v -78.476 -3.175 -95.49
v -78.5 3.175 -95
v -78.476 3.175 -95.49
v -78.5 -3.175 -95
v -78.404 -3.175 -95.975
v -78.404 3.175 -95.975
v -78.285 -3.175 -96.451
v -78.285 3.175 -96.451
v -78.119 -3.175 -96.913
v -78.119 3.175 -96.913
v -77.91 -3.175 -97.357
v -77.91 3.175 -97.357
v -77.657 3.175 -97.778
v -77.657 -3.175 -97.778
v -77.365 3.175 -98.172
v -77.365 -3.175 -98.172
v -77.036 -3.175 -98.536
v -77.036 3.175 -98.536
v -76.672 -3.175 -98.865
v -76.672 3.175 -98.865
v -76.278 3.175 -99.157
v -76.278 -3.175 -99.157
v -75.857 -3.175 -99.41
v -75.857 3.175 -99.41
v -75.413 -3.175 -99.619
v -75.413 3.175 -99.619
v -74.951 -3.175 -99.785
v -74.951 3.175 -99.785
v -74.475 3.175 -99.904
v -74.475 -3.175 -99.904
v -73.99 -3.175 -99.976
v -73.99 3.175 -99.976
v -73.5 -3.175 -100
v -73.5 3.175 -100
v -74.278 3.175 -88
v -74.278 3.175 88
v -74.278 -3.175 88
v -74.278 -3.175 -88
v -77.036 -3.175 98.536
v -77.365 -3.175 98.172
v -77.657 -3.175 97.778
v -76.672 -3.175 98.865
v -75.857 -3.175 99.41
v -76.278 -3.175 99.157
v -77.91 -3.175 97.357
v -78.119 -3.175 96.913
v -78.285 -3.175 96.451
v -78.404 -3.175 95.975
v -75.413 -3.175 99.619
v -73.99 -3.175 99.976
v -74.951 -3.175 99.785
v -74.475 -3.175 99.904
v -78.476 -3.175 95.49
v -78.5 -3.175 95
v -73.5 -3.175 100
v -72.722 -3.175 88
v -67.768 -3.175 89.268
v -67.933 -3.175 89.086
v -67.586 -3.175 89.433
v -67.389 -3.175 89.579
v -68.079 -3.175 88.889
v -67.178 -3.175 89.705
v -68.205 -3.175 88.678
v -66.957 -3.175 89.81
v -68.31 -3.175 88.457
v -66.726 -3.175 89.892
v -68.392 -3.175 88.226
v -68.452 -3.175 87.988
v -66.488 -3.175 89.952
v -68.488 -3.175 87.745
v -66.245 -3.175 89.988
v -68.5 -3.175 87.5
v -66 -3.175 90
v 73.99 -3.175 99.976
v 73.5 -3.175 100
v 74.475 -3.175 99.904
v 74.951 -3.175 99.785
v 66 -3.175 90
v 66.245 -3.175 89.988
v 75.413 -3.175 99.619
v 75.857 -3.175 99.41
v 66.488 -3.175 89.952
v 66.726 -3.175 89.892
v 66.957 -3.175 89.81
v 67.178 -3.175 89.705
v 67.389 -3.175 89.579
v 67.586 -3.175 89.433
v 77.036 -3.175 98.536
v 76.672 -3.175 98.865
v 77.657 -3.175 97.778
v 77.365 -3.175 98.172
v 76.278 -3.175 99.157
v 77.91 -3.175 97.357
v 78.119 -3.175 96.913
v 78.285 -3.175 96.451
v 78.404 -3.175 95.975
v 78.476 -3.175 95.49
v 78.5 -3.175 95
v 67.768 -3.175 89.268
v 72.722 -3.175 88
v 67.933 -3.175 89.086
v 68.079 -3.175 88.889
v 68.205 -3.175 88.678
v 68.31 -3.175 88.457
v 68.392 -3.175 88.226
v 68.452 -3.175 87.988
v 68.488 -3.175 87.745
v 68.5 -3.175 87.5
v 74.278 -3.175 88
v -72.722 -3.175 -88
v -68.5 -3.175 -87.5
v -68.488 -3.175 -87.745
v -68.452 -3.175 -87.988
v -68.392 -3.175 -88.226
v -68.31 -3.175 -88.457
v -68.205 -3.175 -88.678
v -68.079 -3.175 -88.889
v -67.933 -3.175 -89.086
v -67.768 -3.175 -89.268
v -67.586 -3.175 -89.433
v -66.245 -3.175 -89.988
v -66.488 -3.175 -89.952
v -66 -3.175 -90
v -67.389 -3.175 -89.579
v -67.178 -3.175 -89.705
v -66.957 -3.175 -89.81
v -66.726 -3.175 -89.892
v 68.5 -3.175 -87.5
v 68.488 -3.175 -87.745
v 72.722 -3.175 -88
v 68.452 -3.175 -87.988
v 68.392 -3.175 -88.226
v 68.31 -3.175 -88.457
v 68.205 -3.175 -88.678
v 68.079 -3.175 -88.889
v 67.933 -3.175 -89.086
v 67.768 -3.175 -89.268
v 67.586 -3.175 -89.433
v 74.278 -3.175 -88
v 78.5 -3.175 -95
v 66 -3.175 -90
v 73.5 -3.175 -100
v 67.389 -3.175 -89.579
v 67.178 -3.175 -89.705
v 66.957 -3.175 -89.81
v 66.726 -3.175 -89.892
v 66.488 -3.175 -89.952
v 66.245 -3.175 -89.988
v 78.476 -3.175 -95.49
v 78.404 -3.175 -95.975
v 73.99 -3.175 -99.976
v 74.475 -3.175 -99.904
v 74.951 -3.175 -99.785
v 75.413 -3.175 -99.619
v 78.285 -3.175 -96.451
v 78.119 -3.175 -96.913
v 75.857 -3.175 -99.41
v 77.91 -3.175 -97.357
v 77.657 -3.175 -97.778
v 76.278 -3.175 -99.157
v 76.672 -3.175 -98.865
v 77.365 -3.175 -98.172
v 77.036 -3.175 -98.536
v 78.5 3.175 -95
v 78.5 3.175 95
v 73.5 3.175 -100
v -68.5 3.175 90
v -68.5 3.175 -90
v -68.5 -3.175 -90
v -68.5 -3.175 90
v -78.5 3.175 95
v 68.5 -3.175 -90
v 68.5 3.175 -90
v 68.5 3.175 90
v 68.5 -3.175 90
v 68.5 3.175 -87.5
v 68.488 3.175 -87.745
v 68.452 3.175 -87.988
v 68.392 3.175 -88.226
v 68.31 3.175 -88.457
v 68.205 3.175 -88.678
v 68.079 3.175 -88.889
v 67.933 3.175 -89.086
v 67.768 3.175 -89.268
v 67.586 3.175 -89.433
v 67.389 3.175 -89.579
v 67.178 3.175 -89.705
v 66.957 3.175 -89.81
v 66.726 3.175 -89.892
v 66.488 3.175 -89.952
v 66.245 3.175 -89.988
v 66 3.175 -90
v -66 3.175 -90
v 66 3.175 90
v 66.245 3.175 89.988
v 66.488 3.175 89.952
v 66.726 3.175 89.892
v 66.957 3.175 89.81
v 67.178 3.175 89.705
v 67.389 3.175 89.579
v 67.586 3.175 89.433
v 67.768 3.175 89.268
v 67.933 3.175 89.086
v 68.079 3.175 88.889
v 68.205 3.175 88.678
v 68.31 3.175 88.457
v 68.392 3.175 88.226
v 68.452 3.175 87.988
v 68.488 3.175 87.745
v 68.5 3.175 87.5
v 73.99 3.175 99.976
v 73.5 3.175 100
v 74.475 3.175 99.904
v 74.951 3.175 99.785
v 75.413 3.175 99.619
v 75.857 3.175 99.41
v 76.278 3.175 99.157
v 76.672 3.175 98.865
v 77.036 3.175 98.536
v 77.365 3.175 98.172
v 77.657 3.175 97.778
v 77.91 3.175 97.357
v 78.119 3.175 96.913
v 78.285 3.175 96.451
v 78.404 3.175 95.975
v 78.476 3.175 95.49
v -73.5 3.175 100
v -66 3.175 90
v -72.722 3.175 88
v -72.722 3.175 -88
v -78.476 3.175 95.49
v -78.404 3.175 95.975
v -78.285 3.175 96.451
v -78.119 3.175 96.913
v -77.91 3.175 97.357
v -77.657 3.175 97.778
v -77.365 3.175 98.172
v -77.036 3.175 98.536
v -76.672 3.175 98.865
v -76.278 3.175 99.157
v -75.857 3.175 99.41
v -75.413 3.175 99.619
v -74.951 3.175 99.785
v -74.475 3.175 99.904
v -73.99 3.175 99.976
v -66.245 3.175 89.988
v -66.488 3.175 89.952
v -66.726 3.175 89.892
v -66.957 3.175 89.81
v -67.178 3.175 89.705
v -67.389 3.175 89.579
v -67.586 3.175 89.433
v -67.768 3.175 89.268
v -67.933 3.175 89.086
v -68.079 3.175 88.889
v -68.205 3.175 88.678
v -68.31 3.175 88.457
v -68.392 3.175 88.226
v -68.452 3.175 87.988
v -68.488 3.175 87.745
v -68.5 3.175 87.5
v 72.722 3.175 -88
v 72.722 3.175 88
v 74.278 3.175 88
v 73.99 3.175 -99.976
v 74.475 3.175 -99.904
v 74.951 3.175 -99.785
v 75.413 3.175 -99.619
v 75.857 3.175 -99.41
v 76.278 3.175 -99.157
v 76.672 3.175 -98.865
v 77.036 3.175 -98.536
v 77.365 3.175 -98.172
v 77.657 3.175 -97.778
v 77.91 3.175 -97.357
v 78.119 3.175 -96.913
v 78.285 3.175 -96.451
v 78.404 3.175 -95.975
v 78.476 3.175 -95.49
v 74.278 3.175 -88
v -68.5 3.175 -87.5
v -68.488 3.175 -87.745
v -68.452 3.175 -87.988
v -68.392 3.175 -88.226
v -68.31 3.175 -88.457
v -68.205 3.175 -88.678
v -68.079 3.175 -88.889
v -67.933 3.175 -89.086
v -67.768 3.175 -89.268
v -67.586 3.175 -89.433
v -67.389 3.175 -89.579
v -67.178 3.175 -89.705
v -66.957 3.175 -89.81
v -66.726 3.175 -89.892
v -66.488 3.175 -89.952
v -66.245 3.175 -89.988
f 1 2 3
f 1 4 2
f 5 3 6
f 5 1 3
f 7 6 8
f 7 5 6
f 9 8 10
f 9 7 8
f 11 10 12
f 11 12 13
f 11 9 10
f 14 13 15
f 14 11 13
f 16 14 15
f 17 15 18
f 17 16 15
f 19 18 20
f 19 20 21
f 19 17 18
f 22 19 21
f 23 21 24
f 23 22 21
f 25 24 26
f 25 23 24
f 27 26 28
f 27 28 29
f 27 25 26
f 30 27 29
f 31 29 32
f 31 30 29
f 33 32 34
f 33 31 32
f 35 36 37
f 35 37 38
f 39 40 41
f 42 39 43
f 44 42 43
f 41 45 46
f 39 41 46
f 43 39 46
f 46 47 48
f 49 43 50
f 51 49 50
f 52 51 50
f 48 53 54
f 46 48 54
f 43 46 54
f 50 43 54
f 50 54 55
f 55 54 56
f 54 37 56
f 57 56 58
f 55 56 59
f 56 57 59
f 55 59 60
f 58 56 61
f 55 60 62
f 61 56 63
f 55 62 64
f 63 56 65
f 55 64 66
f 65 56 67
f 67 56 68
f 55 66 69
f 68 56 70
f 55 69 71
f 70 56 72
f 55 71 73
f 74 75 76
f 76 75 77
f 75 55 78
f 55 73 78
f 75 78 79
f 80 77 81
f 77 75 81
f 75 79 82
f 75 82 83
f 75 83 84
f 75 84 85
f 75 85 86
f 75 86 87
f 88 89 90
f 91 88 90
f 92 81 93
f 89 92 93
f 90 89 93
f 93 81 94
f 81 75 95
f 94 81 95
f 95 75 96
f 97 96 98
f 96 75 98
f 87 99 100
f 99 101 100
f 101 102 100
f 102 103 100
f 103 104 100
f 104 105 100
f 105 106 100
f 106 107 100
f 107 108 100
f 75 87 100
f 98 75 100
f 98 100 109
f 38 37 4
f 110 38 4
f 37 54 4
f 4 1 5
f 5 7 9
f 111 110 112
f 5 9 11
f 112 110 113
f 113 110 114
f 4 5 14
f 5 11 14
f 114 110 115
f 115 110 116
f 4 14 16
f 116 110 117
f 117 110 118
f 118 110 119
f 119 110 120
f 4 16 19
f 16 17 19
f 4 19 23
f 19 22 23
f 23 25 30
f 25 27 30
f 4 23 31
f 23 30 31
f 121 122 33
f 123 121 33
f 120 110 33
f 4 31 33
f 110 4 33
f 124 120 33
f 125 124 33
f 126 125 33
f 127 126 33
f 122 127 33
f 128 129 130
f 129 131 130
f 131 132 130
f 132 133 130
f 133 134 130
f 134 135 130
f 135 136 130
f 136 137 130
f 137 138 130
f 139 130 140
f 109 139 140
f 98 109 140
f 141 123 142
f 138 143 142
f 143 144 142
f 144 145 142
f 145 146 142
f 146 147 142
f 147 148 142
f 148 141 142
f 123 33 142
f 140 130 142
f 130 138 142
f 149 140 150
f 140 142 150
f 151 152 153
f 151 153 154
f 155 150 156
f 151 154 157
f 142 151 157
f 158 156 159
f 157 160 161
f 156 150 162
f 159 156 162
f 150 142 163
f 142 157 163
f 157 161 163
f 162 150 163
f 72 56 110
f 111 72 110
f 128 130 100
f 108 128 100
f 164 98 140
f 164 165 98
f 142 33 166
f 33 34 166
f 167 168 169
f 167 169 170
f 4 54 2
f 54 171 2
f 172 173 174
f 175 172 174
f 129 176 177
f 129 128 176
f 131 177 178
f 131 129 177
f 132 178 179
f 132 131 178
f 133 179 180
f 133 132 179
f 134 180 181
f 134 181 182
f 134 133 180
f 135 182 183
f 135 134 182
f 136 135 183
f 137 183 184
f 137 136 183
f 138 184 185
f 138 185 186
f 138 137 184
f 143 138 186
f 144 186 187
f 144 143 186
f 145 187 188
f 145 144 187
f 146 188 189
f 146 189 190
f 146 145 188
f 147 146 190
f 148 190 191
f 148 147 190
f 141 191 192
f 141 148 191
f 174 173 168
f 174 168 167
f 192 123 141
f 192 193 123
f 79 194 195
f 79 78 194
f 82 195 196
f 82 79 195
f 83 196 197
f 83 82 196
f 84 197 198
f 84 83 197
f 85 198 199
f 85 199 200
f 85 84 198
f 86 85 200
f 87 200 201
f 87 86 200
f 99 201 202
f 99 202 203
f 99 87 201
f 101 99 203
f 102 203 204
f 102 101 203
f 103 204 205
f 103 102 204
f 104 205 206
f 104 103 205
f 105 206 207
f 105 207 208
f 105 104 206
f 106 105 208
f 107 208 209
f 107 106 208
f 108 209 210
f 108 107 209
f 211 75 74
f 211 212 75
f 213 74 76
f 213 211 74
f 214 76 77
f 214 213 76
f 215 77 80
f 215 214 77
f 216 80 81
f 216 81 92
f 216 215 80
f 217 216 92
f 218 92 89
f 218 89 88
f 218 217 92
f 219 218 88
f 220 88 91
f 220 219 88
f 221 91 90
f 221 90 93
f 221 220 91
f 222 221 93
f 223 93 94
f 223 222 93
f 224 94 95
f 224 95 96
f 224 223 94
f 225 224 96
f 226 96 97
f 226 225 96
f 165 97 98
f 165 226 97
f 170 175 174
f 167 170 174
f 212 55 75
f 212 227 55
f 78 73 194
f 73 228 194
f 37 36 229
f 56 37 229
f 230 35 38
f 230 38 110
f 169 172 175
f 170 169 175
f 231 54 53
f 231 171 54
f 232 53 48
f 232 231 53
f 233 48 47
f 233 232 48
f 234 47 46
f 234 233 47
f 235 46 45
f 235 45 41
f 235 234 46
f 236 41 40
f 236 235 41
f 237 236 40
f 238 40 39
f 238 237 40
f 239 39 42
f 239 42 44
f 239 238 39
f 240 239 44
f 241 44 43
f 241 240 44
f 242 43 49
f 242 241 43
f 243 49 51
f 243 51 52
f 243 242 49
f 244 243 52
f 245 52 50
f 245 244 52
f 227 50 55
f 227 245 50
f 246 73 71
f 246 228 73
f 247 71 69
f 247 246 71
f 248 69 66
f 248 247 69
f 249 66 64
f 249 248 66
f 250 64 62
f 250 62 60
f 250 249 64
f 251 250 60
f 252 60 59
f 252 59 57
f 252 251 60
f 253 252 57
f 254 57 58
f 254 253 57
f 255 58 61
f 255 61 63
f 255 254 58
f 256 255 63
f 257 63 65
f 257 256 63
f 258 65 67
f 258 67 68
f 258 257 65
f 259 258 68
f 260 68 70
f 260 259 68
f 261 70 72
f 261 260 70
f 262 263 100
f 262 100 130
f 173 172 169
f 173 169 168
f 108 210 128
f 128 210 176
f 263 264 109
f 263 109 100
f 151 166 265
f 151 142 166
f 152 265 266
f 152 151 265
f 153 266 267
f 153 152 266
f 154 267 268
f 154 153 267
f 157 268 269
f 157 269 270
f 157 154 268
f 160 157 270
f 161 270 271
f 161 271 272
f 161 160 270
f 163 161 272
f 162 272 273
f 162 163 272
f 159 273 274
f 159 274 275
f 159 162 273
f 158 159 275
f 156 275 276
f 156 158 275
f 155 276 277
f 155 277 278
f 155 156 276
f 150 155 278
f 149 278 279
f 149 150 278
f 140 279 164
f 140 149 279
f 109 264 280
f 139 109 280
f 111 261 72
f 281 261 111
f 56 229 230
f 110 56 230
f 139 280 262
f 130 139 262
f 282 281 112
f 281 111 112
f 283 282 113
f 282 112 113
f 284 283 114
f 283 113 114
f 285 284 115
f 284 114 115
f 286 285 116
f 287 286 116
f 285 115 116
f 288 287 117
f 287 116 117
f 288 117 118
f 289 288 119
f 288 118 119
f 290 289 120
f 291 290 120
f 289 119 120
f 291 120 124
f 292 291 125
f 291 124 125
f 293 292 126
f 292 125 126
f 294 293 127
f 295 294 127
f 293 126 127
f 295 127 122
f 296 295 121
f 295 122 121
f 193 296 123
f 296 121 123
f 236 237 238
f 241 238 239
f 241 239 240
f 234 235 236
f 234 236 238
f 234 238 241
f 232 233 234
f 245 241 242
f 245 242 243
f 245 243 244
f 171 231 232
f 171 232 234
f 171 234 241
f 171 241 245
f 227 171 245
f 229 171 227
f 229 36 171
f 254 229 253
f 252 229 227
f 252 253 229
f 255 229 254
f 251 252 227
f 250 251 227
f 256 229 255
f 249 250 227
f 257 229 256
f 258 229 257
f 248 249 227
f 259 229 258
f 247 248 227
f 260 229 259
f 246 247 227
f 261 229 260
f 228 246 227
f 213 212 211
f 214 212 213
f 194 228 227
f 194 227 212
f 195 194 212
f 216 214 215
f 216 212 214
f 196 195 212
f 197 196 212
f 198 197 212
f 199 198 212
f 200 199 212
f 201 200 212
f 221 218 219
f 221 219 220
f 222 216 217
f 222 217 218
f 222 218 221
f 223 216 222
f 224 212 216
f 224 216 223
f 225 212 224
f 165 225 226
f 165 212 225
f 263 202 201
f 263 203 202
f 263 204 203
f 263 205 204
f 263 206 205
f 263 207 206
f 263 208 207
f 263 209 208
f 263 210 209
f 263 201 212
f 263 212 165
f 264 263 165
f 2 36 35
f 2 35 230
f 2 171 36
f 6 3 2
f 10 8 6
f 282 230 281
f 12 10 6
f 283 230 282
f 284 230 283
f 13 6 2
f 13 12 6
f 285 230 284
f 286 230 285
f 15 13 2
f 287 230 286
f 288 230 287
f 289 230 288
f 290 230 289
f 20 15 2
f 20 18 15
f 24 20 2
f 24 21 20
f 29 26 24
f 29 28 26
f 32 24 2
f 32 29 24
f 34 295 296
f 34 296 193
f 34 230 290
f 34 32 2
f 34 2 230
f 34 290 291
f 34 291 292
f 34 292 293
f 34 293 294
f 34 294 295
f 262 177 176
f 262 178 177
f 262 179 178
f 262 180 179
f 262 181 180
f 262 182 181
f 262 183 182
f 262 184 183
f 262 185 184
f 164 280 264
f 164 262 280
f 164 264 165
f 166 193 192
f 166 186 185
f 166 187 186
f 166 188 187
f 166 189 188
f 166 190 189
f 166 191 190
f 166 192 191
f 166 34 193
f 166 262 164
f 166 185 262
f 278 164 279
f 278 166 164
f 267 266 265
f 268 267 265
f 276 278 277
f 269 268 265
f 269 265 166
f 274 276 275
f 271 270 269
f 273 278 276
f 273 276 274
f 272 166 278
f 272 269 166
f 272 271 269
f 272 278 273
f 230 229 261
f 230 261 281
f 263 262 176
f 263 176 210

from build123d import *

# Parameters (mm, degrees)
SKETCH1_W           = 157
SKETCH1_H           = 200
SKETCH1_W_2         = 137
SKETCH1_H_2         = 180
MAINBODY_DEPTH      = 3.175
SHEETLOCK_REACH     = 129.289
SKETCH2_W           = 1.55575
SKETCH2_H           = 176
SKETCH4_W           = 180
SKETCH4_H           = 6.35
BOSS_EXTRUDE1_DEPTH = 137
FILLET1_R           = 5
FILLET2_R           = 2.5


with BuildPart() as part:
    # Sketch1 → MainBody (new, symmetric)
    with BuildSketch(Plane(origin=(0, 0, 0), x_dir=(1, 0, 0), z_dir=(0, 1, 0))):
        Rectangle(SKETCH1_W, SKETCH1_H)
        Rectangle(SKETCH1_W_2, SKETCH1_H_2, mode=Mode.SUBTRACT)
    extrude(amount=MAINBODY_DEPTH, both=True)

    # Sketch2 → SheetLock (cut, up to next)
    with BuildSketch(Plane(origin=(0, 3.175, 0), x_dir=(1, 0, 0), z_dir=(0, 1, 0)), mode=Mode.PRIVATE) as sheetlock_sk1:
        with Locations((-73.5, 0)):
            Rectangle(SKETCH2_W, SKETCH2_H)
    sheetlock_tool1 = extrude(sheetlock_sk1.sketch, amount=-SHEETLOCK_REACH, mode=Mode.PRIVATE) & part.part
    sheetlock = sheetlock_tool1.solids().sort_by_distance((-73.5, 3.175, 0))[0]
    add(sheetlock, mode=Mode.SUBTRACT)

    # Mirror1: SheetLock across plane
    add(sheetlock.mirror(Plane(origin=(0, 0, 0), x_dir=(0, 0, 1), z_dir=(1, 0, 0))), mode=Mode.SUBTRACT)

    # Fillet1
    fillet1_edges = [part.edges().sort_by_distance(p)[0] for p in [
        (78.5, 0, 100),
        (-78.5, 0, 100),
        (-78.5, 0, -100),
        (78.5, 0, -100),
    ]]
    fillet(fillet1_edges, radius=FILLET1_R)

    # Fillet2
    fillet2_edges = [part.edges().sort_by_distance(p)[0] for p in [
        (-68.5, 0, -90),
        (-68.5, 0, 90),
        (68.5, 0, 90),
        (68.5, 0, -90),
    ]]
    fillet(fillet2_edges, radius=FILLET2_R)


with BuildPart() as body_2:
    # Sketch4 → Boss-Extrude1 (new body)
    with BuildSketch(Plane.ZY.offset(-68.5)):
        Rectangle(SKETCH4_W, SKETCH4_H)
    extrude(amount=BOSS_EXTRUDE1_DEPTH)


solid = Compound([part.part, body_2.part])
